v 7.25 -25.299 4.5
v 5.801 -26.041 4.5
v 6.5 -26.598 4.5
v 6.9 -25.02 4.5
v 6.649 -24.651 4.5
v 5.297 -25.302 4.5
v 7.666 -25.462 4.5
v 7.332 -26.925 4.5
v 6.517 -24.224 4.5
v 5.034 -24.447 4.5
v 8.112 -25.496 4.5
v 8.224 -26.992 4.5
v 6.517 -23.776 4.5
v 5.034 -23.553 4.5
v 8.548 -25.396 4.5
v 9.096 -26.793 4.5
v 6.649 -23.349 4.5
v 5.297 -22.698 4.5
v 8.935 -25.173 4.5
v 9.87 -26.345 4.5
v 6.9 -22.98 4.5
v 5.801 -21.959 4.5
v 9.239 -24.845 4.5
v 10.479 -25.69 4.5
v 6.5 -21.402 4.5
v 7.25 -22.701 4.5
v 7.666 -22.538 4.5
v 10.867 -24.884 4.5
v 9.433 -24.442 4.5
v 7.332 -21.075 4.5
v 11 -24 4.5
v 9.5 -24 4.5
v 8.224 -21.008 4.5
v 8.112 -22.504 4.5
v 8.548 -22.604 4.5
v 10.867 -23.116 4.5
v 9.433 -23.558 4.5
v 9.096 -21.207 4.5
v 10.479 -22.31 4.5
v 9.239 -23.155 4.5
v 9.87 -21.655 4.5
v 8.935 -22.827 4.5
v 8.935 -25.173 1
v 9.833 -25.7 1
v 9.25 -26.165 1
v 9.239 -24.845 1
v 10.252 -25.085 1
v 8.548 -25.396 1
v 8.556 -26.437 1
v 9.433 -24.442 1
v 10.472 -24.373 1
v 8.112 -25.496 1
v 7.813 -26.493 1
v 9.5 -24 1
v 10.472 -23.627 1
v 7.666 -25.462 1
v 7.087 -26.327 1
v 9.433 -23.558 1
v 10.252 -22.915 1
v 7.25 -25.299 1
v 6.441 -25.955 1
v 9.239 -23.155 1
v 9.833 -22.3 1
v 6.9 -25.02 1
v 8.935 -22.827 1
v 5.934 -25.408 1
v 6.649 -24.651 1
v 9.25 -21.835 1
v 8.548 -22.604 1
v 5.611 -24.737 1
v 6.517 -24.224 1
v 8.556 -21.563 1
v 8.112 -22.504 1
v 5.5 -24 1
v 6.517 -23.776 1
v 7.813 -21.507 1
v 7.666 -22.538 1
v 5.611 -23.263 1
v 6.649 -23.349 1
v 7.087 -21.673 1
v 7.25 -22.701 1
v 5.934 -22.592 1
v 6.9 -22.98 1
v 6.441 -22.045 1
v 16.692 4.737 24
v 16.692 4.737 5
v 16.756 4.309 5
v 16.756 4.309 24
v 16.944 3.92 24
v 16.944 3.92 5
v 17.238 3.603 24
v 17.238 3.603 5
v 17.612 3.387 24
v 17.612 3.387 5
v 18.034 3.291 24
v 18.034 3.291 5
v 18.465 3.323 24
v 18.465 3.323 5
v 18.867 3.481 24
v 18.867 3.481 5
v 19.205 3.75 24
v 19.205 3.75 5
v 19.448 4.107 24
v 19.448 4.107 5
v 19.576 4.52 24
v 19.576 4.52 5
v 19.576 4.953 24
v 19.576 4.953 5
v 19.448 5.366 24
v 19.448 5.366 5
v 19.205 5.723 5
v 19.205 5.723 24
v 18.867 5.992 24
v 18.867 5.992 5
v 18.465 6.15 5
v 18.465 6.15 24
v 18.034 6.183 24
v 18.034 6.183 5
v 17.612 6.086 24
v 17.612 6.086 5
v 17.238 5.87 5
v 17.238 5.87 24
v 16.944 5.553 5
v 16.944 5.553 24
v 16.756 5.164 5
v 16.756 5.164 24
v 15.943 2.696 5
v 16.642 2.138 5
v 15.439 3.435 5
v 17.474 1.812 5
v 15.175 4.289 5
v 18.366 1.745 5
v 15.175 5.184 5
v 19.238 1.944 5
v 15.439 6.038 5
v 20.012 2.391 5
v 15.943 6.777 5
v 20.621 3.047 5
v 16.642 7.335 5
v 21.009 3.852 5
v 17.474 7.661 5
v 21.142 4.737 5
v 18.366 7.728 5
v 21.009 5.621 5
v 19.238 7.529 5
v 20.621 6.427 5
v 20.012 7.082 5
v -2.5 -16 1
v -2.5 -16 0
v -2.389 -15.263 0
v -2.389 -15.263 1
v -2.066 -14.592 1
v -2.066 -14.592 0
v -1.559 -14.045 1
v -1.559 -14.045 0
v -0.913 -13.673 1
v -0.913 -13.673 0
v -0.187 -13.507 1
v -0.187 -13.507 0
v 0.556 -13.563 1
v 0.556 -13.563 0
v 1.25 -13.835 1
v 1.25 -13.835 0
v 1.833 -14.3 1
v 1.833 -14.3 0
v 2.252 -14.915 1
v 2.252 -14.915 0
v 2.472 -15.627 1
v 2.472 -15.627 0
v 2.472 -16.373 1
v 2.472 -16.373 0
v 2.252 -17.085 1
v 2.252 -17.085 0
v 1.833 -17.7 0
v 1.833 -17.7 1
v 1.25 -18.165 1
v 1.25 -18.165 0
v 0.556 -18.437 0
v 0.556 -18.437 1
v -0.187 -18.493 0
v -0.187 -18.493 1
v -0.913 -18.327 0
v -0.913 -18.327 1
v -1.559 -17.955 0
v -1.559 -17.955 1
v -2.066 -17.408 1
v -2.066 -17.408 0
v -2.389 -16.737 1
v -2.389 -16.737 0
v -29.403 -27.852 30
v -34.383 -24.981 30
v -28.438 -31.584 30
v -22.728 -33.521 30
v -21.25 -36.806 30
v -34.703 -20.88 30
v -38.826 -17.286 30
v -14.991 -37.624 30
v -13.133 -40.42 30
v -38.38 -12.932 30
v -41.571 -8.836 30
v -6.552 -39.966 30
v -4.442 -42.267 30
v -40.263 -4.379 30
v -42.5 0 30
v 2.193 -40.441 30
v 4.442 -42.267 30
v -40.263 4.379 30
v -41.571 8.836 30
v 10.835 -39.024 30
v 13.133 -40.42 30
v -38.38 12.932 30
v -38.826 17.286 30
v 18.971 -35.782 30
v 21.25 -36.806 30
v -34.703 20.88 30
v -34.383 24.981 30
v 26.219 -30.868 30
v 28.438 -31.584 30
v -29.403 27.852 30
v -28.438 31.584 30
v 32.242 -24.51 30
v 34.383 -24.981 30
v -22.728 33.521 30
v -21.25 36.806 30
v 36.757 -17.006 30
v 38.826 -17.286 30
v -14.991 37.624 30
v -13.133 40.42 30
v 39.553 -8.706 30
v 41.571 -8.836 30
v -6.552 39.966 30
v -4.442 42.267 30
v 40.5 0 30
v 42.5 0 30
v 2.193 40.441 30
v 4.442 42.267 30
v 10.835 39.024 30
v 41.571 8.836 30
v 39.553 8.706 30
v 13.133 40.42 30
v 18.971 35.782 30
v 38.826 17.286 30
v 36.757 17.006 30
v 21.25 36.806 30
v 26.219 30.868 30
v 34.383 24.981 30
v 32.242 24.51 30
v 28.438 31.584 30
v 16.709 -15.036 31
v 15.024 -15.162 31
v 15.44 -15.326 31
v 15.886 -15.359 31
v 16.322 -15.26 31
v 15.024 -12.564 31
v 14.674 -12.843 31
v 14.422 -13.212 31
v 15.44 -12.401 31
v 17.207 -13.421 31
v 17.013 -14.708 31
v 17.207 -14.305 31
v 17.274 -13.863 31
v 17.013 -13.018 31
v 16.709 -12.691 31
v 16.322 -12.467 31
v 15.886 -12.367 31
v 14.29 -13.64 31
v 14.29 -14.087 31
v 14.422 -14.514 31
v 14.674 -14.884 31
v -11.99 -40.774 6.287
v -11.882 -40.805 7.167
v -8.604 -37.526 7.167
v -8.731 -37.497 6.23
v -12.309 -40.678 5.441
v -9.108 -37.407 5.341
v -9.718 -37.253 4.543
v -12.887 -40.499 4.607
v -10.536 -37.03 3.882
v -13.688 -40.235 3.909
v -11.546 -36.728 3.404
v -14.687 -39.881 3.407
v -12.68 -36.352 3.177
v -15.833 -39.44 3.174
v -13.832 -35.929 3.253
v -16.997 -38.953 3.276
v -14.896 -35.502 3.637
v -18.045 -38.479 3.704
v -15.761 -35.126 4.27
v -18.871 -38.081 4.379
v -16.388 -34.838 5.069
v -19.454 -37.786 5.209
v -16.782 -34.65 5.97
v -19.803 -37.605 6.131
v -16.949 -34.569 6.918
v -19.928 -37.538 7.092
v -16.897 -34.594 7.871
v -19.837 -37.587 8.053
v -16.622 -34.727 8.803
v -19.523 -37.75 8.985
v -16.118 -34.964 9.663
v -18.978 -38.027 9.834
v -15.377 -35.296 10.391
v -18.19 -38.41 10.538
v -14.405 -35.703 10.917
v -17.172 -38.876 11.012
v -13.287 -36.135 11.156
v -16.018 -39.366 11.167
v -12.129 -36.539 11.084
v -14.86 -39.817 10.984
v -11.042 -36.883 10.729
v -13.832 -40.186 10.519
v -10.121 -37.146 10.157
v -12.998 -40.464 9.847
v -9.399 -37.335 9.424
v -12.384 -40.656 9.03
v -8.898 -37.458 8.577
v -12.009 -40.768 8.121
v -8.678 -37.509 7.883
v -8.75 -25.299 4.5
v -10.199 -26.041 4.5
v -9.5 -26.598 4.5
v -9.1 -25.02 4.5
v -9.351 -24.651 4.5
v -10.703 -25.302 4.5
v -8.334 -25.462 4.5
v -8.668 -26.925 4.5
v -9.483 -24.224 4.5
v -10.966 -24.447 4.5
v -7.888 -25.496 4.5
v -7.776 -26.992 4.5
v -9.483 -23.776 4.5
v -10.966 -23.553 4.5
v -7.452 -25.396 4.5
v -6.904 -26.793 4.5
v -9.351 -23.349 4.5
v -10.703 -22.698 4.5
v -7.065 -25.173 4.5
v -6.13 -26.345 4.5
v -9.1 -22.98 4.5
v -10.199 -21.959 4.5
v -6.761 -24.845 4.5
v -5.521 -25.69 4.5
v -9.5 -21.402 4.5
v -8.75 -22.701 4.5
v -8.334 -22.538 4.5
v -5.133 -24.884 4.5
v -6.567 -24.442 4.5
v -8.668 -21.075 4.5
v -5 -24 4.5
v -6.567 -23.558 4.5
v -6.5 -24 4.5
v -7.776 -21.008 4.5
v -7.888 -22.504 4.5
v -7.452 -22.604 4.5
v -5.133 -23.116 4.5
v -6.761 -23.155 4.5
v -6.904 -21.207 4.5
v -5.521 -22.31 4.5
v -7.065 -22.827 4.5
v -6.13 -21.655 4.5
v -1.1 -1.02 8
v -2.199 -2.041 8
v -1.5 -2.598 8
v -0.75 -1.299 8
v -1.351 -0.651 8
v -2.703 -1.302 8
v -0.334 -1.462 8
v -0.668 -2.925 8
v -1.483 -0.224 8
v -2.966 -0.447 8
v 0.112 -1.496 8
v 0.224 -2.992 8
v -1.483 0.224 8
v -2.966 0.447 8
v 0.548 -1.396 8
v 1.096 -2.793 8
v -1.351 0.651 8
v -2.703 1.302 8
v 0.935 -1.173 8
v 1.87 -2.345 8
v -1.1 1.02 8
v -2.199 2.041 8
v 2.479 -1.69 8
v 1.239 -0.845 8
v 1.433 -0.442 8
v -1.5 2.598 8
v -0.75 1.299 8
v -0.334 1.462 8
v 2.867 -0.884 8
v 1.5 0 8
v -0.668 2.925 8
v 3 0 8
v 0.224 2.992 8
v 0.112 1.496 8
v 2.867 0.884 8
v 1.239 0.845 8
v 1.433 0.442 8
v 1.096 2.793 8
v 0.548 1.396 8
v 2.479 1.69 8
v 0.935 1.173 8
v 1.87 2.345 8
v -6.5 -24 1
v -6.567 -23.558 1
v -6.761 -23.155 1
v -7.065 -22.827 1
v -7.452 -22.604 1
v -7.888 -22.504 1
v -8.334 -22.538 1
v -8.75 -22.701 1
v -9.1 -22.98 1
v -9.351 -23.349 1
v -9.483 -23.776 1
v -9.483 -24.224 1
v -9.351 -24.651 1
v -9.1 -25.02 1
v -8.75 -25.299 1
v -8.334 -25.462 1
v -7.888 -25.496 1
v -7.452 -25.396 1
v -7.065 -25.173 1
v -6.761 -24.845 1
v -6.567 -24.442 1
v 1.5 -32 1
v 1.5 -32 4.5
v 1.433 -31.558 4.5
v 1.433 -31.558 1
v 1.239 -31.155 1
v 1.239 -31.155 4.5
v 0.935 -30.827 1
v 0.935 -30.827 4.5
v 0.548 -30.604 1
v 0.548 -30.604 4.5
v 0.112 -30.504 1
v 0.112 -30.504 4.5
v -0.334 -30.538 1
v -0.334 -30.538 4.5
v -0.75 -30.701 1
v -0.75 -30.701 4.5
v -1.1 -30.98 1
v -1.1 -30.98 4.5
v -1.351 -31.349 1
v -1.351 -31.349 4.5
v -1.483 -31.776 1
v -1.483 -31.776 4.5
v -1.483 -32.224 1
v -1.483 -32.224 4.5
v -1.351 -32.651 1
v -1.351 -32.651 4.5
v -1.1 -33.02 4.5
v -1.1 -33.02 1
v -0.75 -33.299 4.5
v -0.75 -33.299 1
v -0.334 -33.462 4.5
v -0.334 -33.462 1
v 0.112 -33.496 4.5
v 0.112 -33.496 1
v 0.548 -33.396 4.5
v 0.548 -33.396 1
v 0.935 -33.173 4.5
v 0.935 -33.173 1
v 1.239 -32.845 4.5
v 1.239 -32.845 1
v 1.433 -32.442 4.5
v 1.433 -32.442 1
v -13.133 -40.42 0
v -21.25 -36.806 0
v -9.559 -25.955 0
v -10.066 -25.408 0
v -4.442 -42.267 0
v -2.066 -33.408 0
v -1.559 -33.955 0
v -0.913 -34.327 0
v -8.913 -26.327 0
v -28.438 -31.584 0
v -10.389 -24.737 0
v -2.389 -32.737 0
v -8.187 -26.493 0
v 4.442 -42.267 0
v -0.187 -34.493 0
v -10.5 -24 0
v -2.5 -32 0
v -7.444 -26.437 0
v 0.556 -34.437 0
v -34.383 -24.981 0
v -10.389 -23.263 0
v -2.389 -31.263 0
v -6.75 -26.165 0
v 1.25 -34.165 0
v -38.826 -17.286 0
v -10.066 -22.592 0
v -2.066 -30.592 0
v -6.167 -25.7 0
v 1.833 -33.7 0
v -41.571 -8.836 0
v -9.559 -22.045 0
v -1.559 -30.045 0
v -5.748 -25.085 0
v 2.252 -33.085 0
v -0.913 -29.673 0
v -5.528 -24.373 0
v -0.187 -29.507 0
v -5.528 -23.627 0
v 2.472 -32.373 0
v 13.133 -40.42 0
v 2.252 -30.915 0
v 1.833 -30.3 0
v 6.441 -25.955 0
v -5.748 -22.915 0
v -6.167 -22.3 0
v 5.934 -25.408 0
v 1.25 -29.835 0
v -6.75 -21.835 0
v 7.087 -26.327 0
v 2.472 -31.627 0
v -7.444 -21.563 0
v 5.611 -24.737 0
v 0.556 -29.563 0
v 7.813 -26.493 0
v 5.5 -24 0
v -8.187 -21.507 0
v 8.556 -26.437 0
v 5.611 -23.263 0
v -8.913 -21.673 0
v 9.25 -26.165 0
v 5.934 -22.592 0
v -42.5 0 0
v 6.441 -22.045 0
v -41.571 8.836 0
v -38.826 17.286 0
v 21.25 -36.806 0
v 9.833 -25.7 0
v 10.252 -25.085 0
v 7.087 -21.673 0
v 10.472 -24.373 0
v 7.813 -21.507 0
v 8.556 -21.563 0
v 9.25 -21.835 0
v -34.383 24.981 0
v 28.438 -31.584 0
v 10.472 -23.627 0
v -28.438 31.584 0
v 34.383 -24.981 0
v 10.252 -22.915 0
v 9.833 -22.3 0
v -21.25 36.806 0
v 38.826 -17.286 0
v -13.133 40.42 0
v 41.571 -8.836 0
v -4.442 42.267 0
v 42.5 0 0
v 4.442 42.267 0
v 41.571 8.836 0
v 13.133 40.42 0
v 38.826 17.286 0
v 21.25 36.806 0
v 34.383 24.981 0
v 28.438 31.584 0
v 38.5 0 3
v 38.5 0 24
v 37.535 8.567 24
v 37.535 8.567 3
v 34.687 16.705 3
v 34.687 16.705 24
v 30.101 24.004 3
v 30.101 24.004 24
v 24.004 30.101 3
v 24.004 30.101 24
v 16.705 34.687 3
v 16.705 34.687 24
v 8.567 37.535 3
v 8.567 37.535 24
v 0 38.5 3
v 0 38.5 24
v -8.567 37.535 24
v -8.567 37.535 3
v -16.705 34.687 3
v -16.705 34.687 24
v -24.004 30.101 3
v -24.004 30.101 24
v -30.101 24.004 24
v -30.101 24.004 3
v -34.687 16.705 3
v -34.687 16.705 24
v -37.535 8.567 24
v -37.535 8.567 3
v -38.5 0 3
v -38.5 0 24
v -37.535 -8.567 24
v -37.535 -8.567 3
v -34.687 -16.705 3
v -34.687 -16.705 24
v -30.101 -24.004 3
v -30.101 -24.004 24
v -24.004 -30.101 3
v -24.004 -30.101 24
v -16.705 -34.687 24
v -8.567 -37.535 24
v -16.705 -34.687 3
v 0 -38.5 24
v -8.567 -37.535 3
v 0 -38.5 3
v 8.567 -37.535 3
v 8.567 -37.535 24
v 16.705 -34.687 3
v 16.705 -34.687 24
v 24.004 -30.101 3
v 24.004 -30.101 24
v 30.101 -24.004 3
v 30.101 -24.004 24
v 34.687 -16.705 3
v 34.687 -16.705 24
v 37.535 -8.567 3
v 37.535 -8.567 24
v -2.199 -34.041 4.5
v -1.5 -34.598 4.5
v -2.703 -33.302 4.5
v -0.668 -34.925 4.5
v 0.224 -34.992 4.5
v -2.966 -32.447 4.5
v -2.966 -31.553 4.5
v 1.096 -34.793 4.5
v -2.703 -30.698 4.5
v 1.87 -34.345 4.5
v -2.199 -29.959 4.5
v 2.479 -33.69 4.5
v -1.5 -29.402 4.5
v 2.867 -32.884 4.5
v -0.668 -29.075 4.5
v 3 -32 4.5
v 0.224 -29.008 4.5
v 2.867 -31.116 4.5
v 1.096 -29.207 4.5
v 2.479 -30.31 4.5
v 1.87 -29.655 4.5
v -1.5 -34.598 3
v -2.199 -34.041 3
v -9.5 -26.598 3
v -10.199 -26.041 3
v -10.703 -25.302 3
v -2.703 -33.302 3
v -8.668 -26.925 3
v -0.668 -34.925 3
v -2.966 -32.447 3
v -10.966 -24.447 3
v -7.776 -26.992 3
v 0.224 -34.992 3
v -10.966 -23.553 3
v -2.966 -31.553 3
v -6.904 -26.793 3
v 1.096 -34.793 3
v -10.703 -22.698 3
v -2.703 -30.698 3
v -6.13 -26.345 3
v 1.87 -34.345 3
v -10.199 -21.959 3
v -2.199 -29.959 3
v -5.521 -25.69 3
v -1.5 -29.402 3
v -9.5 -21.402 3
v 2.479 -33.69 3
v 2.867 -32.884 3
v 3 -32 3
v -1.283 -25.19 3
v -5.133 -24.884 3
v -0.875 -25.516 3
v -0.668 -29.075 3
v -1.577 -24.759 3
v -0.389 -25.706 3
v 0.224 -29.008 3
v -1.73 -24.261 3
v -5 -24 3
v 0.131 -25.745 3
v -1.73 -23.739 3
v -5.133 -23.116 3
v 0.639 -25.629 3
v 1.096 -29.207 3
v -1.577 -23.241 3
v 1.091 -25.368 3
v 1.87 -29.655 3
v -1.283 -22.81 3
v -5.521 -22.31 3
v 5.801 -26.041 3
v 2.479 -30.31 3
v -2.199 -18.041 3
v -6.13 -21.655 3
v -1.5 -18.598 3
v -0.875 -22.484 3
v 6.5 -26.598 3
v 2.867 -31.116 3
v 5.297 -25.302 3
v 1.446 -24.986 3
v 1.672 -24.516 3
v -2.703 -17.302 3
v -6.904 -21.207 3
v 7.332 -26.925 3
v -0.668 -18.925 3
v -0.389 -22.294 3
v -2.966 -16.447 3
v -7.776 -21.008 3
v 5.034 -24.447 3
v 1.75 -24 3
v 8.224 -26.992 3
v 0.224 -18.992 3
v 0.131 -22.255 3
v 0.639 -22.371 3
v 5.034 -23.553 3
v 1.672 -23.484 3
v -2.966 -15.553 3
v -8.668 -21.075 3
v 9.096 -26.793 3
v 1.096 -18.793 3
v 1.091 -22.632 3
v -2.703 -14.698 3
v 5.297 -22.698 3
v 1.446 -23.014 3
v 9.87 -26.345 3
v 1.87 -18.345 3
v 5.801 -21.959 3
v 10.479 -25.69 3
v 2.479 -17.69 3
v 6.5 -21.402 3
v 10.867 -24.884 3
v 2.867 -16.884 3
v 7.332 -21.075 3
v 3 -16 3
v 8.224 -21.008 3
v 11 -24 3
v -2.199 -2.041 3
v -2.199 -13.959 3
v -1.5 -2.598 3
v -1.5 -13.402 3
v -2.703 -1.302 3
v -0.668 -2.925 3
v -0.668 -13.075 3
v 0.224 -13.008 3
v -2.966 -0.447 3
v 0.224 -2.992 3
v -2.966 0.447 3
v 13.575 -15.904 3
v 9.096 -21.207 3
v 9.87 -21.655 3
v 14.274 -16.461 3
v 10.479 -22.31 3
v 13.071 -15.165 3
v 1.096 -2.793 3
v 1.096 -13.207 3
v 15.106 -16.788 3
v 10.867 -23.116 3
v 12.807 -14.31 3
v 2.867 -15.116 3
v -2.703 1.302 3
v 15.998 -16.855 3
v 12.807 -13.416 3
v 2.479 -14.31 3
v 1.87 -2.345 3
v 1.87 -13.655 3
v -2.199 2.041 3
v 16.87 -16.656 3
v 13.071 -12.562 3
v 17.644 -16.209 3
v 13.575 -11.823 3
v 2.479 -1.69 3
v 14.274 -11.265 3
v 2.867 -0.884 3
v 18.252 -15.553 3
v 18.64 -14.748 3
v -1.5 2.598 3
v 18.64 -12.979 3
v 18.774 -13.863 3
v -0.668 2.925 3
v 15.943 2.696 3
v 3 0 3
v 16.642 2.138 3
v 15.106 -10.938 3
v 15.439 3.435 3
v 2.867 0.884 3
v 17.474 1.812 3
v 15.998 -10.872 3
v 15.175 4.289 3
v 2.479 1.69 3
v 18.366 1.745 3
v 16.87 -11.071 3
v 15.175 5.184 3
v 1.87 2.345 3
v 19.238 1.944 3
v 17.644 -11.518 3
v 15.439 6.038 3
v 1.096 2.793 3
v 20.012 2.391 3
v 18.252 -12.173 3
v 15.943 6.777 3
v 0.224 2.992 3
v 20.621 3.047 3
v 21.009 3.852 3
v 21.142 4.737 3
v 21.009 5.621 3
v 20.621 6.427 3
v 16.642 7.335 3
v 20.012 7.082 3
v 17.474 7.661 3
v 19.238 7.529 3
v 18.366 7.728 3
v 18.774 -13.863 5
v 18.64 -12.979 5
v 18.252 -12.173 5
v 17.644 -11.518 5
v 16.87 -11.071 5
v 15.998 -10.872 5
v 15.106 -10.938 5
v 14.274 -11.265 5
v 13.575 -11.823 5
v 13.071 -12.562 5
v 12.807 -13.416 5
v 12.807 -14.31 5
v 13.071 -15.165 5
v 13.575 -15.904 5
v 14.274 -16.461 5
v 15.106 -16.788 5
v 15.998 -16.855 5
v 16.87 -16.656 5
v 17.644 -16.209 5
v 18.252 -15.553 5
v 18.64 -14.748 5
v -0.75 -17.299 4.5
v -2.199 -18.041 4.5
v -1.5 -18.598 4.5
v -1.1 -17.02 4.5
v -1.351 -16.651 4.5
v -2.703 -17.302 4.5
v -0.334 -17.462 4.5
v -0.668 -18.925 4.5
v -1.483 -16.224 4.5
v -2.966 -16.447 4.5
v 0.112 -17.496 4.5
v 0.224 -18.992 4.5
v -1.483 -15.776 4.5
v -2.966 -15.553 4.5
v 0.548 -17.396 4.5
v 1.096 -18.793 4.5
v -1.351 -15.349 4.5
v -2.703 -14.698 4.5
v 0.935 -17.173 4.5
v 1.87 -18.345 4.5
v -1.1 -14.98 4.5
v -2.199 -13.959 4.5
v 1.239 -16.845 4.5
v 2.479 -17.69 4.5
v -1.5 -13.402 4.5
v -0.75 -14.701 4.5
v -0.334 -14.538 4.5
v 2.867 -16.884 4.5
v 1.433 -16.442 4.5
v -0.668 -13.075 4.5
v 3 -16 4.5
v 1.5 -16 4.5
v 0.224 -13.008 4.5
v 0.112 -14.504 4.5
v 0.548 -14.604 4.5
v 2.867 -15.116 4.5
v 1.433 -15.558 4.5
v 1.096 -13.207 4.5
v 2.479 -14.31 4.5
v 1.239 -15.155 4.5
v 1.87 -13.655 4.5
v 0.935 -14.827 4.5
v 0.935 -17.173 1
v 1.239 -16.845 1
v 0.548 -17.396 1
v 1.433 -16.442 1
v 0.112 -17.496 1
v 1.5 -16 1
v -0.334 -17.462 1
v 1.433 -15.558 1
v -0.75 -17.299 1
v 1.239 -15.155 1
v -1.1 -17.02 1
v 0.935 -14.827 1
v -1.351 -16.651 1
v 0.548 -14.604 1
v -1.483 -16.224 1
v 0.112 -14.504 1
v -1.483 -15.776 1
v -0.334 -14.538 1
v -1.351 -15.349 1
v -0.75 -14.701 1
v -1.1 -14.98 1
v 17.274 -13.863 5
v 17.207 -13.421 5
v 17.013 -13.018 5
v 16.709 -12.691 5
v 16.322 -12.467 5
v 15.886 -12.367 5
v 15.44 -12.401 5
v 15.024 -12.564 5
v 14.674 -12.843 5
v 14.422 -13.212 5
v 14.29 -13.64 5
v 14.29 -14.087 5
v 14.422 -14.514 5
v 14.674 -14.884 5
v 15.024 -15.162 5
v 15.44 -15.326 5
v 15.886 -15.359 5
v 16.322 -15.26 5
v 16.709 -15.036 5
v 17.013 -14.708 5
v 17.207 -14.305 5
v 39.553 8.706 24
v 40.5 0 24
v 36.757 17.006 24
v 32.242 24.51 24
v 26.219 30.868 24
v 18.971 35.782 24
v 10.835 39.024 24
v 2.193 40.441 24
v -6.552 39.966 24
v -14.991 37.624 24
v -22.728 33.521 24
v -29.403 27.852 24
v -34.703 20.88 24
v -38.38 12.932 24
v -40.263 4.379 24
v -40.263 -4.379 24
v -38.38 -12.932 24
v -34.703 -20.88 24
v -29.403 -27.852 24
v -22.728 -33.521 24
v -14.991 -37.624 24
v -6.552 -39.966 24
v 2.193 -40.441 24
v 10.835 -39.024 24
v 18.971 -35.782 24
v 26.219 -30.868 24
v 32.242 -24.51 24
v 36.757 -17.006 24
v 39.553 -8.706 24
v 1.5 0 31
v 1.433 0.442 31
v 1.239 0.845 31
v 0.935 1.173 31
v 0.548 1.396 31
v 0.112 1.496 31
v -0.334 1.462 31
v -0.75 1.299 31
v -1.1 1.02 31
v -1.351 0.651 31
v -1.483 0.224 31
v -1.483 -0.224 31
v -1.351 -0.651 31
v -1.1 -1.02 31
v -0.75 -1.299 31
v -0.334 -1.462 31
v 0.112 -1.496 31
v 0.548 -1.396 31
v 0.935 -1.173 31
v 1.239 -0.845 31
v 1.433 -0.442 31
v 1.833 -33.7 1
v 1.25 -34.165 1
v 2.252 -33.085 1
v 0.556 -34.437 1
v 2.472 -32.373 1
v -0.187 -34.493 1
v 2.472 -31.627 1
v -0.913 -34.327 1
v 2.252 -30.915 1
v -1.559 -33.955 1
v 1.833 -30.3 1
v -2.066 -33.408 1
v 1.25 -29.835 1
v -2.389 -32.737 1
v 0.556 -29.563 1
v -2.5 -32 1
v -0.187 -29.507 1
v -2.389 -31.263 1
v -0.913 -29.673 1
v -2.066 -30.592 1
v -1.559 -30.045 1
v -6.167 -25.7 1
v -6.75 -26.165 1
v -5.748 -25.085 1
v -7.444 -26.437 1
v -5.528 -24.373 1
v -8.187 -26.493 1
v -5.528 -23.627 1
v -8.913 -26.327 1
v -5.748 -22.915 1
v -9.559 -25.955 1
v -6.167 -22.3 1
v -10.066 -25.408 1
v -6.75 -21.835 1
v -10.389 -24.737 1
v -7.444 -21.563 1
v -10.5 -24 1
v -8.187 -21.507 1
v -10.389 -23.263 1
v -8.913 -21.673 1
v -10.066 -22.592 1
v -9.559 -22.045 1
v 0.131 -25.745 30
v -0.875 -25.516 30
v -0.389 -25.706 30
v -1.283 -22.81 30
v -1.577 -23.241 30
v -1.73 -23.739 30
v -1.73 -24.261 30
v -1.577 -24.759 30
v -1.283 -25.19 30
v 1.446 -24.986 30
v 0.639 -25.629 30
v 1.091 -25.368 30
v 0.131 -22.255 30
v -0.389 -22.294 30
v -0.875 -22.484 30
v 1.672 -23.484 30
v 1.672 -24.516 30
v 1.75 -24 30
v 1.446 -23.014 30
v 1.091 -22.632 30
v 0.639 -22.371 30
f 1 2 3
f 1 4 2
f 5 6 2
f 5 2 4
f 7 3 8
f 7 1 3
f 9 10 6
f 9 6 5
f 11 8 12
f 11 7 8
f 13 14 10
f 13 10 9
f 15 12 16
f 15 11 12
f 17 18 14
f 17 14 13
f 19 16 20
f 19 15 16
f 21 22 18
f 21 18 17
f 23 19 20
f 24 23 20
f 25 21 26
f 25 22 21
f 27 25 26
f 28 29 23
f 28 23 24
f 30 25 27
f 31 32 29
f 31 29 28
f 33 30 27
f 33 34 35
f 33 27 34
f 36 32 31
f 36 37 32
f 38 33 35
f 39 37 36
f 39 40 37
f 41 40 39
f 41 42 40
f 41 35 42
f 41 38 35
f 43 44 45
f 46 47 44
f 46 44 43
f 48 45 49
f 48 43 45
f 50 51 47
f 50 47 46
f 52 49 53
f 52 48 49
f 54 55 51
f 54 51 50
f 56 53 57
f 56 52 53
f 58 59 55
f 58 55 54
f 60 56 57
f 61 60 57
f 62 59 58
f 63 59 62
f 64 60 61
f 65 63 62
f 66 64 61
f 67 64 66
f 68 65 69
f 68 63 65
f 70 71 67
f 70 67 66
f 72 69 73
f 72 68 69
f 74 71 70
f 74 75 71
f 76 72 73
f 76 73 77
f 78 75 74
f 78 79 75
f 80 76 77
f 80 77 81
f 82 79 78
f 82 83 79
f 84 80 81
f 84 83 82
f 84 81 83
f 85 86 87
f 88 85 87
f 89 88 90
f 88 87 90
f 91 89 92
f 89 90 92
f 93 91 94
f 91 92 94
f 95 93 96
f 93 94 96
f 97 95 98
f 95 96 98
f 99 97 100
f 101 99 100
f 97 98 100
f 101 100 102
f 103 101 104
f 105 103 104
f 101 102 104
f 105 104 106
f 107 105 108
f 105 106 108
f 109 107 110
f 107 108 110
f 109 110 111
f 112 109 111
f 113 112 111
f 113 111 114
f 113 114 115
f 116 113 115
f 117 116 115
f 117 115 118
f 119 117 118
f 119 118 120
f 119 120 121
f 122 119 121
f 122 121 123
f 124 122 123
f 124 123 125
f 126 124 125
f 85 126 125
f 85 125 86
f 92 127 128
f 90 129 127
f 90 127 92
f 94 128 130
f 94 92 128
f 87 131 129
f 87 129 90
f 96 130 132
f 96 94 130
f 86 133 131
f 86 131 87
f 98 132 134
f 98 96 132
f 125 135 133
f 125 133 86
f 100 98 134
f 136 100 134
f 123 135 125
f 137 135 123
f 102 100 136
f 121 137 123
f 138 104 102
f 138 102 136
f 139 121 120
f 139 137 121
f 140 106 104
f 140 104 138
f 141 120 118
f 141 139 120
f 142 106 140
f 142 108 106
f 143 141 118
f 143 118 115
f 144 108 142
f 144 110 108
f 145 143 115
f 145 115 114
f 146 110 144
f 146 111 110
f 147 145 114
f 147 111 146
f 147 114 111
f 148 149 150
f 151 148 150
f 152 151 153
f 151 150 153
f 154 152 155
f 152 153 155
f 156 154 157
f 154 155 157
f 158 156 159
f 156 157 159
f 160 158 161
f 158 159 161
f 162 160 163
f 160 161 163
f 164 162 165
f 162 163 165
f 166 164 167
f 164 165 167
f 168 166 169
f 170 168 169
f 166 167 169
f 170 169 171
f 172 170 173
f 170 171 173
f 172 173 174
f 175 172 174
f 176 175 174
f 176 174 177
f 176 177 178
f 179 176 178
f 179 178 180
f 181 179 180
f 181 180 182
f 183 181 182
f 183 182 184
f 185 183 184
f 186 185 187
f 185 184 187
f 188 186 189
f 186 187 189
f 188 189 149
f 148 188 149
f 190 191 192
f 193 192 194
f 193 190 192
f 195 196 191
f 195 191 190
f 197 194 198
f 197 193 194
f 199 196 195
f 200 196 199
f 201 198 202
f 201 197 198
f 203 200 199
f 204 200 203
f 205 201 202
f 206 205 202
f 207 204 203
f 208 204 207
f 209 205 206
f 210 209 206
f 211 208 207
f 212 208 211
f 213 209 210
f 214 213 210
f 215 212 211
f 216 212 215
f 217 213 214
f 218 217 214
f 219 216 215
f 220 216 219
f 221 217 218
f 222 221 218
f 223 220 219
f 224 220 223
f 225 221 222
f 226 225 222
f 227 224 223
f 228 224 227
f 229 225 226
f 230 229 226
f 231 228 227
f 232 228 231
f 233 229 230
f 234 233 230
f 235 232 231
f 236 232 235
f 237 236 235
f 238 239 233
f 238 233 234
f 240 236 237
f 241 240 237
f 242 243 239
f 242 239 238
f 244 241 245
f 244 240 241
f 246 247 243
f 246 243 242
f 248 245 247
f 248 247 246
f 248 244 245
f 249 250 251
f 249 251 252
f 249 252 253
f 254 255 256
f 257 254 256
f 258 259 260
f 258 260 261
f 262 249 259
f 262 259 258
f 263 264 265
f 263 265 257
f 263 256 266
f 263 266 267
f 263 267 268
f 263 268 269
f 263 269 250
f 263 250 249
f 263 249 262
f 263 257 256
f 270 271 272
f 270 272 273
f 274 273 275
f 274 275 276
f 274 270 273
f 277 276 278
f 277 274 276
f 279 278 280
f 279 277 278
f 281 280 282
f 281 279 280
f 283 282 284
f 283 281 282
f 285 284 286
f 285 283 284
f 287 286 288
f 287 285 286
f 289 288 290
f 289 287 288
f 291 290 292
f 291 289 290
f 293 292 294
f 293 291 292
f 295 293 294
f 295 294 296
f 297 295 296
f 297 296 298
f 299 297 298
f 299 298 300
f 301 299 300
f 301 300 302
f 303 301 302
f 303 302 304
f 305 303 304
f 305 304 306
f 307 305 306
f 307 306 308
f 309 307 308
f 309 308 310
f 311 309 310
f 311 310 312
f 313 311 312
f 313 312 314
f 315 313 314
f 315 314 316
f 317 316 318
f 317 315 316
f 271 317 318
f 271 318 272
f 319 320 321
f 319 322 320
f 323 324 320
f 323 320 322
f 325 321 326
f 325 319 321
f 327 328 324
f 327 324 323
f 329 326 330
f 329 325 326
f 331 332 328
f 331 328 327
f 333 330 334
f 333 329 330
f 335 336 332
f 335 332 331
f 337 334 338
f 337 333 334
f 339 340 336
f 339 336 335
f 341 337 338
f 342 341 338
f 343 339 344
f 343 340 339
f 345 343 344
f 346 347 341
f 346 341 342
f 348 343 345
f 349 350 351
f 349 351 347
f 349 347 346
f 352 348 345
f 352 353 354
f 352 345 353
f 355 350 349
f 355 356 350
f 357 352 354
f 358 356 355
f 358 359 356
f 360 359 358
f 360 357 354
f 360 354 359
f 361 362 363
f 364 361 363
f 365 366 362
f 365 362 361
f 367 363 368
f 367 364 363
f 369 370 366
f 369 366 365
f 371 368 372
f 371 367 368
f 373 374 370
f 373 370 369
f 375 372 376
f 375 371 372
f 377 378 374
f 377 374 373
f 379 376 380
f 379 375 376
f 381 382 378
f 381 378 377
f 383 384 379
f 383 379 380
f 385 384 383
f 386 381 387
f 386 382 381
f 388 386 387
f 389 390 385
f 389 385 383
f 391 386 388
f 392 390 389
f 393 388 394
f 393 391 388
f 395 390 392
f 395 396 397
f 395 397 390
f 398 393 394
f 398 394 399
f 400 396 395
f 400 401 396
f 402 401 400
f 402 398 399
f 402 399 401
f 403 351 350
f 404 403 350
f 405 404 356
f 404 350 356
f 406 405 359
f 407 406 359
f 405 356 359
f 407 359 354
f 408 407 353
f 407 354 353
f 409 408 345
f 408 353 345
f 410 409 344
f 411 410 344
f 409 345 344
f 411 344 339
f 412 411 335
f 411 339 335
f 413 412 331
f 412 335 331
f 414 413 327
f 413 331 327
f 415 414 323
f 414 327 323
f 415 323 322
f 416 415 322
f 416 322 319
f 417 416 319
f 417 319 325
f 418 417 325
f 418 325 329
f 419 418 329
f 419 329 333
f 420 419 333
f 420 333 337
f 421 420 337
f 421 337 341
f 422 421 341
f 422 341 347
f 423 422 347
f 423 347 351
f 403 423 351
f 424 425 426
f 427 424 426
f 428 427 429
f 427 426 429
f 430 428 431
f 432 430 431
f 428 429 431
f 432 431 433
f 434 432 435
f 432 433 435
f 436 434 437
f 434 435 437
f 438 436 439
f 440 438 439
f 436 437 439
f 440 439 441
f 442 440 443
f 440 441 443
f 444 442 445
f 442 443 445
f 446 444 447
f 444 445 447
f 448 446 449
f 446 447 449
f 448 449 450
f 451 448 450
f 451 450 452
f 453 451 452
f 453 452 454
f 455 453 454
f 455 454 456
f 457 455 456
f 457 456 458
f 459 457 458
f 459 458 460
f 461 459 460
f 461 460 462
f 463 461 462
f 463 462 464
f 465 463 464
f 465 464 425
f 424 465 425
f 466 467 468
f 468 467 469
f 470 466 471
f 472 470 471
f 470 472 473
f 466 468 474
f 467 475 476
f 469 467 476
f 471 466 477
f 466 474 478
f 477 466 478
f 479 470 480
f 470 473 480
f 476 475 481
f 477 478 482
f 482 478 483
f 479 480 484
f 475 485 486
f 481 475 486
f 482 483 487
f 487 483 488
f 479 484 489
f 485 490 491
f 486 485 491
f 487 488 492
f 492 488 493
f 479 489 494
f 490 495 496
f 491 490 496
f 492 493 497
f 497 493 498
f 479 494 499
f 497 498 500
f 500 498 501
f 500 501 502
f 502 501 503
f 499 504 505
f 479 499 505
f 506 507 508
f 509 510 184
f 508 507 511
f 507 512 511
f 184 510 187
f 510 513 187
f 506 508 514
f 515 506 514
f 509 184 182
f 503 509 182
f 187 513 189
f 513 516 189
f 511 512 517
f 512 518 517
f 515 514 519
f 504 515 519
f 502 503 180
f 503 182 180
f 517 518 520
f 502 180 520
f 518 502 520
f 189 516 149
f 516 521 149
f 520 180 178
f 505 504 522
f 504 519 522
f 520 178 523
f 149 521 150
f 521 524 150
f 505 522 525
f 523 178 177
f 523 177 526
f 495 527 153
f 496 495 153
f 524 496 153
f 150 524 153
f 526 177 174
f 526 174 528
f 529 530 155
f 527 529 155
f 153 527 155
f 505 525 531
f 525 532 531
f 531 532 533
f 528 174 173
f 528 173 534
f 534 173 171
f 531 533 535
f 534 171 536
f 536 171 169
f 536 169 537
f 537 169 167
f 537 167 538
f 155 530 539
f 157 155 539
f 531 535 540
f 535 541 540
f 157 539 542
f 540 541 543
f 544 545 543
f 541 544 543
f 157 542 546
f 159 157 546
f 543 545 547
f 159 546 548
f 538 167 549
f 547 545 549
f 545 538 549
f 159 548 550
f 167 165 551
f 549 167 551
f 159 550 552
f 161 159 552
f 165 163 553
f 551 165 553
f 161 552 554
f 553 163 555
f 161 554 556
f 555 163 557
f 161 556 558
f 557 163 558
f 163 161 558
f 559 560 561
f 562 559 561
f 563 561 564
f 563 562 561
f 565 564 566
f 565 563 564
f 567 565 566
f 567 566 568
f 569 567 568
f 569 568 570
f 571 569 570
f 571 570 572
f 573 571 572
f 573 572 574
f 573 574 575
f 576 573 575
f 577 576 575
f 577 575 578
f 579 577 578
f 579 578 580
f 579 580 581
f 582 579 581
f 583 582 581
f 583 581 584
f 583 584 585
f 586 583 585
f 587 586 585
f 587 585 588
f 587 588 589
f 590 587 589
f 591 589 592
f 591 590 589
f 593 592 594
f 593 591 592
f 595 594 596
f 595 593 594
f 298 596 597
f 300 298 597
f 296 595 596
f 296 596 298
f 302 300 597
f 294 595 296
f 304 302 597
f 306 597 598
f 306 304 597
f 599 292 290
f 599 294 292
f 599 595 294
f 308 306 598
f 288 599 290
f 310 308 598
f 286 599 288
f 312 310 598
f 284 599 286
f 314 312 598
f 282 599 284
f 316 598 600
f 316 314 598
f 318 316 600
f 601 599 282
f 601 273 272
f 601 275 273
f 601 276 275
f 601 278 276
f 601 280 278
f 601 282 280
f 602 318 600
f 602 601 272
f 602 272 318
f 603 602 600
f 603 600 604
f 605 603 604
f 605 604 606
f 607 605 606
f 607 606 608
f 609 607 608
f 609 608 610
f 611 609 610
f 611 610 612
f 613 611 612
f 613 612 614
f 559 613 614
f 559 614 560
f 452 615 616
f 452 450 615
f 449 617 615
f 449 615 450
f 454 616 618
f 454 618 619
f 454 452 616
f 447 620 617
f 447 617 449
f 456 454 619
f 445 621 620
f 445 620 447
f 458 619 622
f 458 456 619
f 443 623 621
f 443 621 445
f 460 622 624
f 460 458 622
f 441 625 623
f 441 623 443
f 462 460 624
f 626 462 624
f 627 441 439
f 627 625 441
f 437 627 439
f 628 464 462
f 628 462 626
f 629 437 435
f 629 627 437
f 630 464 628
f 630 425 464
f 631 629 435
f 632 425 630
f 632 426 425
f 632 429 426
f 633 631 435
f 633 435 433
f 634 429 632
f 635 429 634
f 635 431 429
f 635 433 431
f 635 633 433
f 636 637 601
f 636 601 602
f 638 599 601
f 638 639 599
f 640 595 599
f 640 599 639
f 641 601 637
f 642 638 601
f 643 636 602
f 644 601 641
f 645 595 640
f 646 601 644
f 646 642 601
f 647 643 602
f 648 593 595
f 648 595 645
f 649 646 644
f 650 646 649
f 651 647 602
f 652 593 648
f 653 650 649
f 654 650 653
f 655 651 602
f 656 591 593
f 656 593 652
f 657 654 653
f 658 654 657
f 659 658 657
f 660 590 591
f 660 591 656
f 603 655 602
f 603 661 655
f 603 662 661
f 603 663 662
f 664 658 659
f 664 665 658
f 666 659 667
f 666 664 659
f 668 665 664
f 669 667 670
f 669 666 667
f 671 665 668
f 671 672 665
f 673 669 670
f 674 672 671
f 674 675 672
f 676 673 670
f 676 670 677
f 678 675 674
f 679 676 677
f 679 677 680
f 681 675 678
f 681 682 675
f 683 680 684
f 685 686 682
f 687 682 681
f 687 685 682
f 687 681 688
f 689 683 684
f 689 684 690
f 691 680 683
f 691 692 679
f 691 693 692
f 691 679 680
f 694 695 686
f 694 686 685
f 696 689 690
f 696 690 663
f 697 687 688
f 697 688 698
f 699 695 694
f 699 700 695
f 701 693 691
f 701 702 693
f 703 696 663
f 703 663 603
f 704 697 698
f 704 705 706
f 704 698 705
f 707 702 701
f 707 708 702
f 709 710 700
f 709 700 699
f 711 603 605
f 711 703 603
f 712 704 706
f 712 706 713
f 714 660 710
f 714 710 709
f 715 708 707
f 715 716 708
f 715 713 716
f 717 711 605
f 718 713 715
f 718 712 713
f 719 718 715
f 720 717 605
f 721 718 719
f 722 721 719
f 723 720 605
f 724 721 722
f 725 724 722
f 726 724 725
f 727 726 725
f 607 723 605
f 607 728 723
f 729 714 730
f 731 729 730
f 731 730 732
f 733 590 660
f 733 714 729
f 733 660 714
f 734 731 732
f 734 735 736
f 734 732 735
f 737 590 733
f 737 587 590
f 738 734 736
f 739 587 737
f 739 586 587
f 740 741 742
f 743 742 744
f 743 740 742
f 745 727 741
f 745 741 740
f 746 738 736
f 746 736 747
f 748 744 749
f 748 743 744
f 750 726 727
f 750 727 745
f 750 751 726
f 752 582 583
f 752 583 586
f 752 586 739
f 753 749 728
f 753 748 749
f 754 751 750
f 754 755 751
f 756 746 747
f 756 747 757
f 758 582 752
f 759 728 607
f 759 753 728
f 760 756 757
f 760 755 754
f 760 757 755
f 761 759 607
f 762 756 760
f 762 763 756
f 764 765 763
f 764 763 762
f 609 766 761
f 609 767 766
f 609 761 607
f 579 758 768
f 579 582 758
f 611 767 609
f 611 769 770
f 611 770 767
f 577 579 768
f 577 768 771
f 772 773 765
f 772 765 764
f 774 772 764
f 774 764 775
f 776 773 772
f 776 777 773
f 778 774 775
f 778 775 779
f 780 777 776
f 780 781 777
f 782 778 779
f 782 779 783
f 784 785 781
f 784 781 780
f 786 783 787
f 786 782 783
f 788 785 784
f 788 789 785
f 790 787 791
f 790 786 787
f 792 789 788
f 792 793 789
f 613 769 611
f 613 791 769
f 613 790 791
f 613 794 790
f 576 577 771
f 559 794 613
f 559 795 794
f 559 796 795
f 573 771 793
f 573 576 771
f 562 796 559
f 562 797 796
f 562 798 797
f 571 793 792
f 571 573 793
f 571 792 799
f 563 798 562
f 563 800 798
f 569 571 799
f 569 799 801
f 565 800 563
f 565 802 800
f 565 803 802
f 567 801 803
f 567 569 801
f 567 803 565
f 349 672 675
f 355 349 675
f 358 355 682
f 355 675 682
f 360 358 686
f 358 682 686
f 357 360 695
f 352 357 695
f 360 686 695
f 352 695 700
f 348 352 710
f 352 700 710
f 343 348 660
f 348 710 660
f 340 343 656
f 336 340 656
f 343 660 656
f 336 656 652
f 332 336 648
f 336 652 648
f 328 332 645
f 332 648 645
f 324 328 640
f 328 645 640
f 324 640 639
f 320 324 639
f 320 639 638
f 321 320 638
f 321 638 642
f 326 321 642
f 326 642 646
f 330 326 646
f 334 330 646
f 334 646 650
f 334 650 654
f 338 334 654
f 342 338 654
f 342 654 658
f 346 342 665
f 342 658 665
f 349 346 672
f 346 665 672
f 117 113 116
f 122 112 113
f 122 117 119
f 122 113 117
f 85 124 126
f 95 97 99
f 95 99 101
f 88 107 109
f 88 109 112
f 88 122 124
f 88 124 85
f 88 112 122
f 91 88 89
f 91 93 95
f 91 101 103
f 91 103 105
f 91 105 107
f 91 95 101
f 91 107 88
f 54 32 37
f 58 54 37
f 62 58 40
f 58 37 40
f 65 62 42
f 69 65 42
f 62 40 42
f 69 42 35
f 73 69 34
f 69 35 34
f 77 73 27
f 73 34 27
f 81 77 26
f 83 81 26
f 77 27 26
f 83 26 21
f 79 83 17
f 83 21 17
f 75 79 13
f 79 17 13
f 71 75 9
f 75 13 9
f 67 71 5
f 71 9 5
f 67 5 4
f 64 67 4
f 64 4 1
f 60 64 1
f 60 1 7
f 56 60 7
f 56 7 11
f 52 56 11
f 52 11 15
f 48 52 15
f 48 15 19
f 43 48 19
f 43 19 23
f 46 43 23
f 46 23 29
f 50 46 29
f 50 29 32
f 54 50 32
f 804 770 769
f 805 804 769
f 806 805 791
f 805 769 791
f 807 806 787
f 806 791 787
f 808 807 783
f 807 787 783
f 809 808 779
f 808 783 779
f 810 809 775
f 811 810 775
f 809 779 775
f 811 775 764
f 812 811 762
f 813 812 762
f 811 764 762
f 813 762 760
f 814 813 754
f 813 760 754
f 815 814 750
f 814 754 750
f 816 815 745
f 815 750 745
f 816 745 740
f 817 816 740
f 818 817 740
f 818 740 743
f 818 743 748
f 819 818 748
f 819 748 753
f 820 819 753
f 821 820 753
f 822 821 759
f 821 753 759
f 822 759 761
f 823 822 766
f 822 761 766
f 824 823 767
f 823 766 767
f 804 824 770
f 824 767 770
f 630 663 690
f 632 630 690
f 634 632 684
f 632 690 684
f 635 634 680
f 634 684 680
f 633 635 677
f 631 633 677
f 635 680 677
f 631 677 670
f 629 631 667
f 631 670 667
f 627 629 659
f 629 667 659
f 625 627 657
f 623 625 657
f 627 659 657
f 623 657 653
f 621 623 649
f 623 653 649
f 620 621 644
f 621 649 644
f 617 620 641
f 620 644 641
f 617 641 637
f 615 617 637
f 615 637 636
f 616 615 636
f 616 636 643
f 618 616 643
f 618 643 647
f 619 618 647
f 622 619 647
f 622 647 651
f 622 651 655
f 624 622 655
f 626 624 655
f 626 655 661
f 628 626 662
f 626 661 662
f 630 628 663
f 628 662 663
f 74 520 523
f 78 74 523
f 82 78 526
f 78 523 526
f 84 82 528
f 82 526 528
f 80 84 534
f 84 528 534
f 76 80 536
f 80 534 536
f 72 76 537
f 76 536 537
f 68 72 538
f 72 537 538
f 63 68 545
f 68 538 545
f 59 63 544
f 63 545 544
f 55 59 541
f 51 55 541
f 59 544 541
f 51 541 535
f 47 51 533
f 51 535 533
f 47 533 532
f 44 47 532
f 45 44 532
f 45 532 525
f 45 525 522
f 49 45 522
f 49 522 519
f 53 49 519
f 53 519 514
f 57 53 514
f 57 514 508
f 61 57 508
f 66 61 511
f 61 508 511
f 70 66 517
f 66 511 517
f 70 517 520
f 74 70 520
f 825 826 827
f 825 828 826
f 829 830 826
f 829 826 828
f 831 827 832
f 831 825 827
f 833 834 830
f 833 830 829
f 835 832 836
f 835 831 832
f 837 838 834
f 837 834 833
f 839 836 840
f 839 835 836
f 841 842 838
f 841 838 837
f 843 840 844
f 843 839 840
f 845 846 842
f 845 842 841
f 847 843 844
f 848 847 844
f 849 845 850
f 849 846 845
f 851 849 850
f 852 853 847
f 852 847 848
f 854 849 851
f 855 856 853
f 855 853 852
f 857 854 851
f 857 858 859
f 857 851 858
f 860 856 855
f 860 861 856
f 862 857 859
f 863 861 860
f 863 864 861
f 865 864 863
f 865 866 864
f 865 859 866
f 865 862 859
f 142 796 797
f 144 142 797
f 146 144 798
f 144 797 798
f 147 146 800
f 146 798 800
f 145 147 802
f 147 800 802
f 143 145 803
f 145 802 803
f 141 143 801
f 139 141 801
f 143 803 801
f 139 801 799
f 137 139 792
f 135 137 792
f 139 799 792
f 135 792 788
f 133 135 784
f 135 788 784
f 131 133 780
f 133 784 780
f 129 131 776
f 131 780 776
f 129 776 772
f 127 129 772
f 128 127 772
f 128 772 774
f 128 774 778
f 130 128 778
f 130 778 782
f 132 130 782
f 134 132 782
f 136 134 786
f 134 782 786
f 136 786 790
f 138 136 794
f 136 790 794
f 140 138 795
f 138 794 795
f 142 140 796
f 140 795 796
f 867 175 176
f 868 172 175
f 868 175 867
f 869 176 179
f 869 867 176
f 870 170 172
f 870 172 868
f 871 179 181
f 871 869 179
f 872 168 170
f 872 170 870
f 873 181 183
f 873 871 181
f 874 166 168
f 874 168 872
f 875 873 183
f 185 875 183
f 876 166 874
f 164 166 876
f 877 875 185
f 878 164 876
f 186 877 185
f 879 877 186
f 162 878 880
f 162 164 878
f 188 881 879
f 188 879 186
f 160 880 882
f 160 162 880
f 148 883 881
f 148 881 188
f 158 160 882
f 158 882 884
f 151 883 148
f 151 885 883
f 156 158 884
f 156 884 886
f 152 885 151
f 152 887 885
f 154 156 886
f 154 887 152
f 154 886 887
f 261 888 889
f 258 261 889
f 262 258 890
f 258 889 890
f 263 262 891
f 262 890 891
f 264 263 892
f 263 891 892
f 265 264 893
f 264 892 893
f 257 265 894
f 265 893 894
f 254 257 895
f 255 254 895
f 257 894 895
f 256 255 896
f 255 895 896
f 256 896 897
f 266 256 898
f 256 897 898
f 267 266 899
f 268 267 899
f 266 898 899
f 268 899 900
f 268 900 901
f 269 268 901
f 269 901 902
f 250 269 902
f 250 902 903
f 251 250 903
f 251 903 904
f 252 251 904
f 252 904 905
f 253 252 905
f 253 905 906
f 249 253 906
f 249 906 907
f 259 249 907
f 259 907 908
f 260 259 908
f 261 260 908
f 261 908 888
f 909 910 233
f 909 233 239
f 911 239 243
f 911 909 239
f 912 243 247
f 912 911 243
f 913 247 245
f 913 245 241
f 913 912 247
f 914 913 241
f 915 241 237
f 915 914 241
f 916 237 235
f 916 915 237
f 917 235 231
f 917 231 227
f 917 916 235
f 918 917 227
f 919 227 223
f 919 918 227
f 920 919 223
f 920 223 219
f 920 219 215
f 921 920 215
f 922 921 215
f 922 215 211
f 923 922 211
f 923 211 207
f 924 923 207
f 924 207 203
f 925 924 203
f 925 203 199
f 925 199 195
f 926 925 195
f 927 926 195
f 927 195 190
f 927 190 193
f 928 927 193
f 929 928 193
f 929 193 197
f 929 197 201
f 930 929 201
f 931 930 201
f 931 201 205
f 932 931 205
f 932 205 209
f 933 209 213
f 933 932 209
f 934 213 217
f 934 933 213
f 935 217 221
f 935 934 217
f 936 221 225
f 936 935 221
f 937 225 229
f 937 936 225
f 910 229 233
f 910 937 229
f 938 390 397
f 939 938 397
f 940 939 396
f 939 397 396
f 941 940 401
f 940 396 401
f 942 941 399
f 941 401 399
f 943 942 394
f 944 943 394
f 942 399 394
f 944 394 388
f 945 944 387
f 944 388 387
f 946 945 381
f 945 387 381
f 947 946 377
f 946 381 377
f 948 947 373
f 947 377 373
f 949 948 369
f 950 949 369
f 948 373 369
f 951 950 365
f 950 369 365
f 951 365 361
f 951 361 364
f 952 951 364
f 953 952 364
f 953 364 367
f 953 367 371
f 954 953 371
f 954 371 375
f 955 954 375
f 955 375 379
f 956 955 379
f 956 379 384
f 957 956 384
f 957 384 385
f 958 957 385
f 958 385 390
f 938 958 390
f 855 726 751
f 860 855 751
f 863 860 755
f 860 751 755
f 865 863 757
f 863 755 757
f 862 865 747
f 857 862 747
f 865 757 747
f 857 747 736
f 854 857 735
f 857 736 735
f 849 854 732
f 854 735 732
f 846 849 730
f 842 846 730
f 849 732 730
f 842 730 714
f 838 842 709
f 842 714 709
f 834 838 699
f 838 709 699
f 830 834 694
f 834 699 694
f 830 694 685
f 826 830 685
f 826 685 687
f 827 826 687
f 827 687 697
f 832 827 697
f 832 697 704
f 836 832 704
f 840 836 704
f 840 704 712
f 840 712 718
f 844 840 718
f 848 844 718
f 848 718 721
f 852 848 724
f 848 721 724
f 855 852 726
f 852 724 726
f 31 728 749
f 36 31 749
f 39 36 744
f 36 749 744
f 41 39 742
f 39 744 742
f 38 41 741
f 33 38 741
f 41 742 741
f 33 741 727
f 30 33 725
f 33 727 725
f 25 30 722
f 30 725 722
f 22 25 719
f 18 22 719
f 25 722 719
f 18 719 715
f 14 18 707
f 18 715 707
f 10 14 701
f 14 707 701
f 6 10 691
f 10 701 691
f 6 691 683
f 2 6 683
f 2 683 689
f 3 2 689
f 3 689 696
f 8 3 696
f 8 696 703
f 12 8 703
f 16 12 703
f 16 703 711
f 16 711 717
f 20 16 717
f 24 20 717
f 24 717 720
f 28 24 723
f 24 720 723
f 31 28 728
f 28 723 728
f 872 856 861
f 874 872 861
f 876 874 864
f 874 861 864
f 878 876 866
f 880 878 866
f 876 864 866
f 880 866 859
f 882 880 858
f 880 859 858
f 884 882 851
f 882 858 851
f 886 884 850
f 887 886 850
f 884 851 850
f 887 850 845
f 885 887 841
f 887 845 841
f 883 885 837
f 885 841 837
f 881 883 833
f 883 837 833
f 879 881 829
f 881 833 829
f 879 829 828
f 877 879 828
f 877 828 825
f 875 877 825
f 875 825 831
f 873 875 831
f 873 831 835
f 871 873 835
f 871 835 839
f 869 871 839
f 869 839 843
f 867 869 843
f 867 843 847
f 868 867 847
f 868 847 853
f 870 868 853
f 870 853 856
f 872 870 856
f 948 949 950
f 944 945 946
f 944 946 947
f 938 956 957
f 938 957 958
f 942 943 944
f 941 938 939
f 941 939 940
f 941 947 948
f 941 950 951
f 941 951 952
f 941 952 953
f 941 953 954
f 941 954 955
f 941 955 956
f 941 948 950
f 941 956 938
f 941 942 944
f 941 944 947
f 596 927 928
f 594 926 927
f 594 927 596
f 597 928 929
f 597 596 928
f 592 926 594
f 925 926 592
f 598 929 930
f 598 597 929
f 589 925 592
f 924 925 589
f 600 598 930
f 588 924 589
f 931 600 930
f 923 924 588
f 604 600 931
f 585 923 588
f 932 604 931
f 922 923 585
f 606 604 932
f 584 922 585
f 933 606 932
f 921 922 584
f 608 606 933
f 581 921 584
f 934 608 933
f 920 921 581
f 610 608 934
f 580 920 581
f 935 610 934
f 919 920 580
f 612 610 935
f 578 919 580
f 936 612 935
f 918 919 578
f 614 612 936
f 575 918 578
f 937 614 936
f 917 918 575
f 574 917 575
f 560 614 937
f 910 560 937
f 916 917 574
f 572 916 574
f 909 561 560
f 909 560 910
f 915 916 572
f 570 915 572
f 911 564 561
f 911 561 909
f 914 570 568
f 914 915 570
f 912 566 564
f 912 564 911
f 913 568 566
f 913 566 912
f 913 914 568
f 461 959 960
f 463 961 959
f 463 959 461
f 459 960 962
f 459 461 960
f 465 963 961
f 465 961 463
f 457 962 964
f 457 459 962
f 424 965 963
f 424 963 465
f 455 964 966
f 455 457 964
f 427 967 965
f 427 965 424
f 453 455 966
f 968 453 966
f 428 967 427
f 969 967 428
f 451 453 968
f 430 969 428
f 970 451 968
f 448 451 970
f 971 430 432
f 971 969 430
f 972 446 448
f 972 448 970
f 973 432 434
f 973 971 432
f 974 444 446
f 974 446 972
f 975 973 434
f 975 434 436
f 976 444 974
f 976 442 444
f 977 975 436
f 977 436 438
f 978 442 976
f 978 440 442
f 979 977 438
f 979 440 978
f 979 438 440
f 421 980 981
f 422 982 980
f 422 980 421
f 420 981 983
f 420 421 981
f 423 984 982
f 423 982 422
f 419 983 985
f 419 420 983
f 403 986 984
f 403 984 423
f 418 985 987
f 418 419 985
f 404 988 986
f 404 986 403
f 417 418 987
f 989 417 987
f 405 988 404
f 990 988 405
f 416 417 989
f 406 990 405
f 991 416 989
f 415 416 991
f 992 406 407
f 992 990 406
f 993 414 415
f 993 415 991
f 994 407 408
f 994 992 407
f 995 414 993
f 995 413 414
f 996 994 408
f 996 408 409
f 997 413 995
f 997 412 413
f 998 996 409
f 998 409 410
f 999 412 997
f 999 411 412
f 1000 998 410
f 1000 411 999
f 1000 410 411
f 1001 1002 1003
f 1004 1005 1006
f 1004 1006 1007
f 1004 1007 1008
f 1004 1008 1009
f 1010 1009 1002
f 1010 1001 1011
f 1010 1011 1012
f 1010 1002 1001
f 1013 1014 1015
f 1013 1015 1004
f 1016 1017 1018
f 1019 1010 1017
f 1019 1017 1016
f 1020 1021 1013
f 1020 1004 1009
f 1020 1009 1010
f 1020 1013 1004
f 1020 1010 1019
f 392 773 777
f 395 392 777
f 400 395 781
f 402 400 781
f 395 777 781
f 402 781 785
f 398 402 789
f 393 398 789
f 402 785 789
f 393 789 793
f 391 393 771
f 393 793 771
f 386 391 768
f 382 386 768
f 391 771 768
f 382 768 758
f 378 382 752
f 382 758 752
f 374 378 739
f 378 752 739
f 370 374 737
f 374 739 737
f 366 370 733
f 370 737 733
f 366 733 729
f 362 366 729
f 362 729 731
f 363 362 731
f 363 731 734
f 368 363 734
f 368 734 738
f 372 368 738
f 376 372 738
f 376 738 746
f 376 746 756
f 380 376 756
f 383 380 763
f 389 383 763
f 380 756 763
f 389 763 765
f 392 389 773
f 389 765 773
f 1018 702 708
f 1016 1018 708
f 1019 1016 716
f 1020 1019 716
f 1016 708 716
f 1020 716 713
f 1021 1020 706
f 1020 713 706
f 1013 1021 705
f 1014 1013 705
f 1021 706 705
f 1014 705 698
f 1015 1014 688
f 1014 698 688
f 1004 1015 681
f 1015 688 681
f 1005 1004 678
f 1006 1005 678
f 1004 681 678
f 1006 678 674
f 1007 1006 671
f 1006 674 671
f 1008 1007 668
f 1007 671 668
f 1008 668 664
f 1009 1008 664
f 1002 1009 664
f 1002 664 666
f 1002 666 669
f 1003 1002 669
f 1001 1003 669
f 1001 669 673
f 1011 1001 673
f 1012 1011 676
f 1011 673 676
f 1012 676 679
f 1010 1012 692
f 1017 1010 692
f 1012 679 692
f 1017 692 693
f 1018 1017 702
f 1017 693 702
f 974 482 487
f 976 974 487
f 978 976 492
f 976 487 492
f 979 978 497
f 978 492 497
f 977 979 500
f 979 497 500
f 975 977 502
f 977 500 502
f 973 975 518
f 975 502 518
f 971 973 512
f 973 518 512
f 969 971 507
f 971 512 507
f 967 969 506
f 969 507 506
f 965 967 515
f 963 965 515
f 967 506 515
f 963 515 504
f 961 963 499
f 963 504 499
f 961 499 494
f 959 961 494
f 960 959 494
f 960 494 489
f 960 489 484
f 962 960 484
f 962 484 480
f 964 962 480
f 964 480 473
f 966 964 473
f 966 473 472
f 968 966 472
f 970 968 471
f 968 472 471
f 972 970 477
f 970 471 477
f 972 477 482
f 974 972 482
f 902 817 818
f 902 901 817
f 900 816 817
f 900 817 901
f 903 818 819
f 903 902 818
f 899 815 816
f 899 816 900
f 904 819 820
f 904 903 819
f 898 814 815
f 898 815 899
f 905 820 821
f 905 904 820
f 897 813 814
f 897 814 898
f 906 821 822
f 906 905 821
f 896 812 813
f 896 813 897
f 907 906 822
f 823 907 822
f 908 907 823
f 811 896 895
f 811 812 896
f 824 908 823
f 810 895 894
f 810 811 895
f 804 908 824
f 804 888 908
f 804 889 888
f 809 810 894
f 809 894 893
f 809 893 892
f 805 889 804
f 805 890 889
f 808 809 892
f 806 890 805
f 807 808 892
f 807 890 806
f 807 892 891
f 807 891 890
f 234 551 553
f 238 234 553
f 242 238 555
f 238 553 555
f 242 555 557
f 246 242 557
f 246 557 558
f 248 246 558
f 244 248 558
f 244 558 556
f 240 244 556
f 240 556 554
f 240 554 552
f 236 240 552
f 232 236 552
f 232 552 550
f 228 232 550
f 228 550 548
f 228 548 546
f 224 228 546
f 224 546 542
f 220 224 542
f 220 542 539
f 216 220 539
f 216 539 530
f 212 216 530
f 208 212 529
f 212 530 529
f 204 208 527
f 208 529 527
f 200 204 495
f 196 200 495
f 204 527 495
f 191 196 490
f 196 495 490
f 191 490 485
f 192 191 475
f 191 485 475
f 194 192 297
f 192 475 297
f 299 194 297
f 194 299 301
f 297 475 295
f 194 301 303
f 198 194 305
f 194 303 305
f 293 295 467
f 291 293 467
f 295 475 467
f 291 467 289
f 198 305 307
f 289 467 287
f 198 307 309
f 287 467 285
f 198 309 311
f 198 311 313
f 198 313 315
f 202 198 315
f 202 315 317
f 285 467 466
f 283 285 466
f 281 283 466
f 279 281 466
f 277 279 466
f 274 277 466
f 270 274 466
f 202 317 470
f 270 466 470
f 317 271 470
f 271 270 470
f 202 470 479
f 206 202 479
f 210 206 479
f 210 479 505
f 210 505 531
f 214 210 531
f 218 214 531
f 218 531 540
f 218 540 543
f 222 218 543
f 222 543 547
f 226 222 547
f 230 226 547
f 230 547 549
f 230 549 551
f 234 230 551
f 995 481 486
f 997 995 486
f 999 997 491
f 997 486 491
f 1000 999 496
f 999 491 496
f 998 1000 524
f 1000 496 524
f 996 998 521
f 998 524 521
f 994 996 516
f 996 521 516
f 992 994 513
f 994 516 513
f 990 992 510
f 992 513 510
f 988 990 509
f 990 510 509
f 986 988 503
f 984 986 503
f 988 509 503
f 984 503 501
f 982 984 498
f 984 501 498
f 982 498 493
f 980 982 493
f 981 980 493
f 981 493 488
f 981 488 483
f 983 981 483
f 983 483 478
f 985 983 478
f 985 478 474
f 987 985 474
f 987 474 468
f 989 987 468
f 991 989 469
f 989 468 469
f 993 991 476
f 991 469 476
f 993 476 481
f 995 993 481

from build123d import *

# Parameters (mm, degrees)
SKETCH_1_R              = 42.5
SKETCH_1_R_2            = 40.5
EXTRUDE_1_DEPTH         = 30
SKETCH_2_R              = 40.5
SKETCH_2_R_2            = 38.5
EXTRUDE_2_DEPTH         = 24
EXTRUDE_3_OUTLINE_R     = 38.5
EXTRUDE_3_DEPTH         = 3
SKETCH_5_R              = 1.75
EXTRUDE_4_DEPTH         = 27
SKETCH_10_R             = 3
EXTRUDE_10_DEPTH        = 1.5
SKETCH_21_R             = 1.5
CUT_EXTRUDE_1_DEPTH     = 66.289738857
SKETCH_6_R              = 1.5
EXTRUDE_5_DEPTH         = 28
SKETCH_7_R              = 3
EXTRUDE_6_DEPTH         = 2
SKETCH_8_R              = 1.45
EXTRUDE_7_DEPTH         = 21
SKETCH_9_R              = 3
EXTRUDE_8_DEPTH         = 2
SKETCH_22_R             = 2.5
CUT_EXTRUDE_2_DEPTH     = 1
SKETCH_23_R             = 1.5
EXTRUDE_11_DEPTH        = 28
SKETCH_25_R             = 3
EXTRUDE_12_DEPTH        = 5
CUT_EXTRUDE_START       = -40.635067554
CUT_EXTRUDE_3_OUTLINE_R = 4
CUT_EXTRUDE_3_DEPTH     = 8.016303225


# Read off the part's stored shape, not the designer's step: 凸台-拉伸3, 切除-拉伸3
with BuildPart() as part:
    # 草图1 → 凸台-拉伸1 (new body)
    with BuildSketch(Plane.XY):
        Circle(SKETCH_1_R)
        Circle(SKETCH_1_R_2, mode=Mode.SUBTRACT)
    extrude(amount=EXTRUDE_1_DEPTH)

    # 草图2 → 凸台-拉伸2 (add)
    with BuildSketch(Plane.XY):
        Circle(SKETCH_2_R)
        Circle(SKETCH_2_R_2, mode=Mode.SUBTRACT)
    extrude(amount=EXTRUDE_2_DEPTH)

    # 凸台-拉伸3 outline → 凸台-拉伸3 (add)
    with BuildSketch(Plane.XY):
        Circle(EXTRUDE_3_OUTLINE_R)
    extrude(amount=EXTRUDE_3_DEPTH)

    # 草图5 → 凸台-拉伸4 (add)
    with BuildSketch(Plane.XY.offset(3)):
        with Locations((0, -24)):
            Circle(SKETCH_5_R)
    extrude(amount=EXTRUDE_4_DEPTH)

    # 草图10 → 凸台-拉伸10 (add)
    with BuildSketch(Plane.XY.offset(3)):
        with Locations((8, -24)):
            Circle(SKETCH_10_R)
        with Locations((0, -16)):
            Circle(SKETCH_10_R)
        with Locations((-8, -24)):
            Circle(SKETCH_10_R)
        with Locations((0, -32)):
            Circle(SKETCH_10_R)
    extrude(amount=EXTRUDE_10_DEPTH)

    # 草图21 → 切除-拉伸1 (cut, through all)
    with BuildSketch(Plane.XY.offset(4.5)):
        with Locations((-8, -24)):
            Circle(SKETCH_21_R)
        with Locations((0, -16)):
            Circle(SKETCH_21_R)
        with Locations((8, -24)):
            Circle(SKETCH_21_R)
        with Locations((0, -32)):
            Circle(SKETCH_21_R)
    extrude(amount=-CUT_EXTRUDE_1_DEPTH, mode=Mode.SUBTRACT)

    # 草图6 → 凸台-拉伸5 (add)
    with BuildSketch(Plane.XY.offset(3)):
        with Locations((15.773694335, -13.86328125)):
            Circle(SKETCH_6_R)
    extrude(amount=EXTRUDE_5_DEPTH)

    # 草图7 → 凸台-拉伸6 (add)
    with BuildSketch(Plane.XY.offset(3)):
        with Locations((15.773694335, -13.86328125)):
            Circle(SKETCH_7_R)
    extrude(amount=EXTRUDE_6_DEPTH)

    # 草图8 → 凸台-拉伸7 (add)
    with BuildSketch(Plane.XY.offset(3)):
        with Locations(Location((18.141870405, 4.736563967, 0), (0, 0, 180))):
            Circle(SKETCH_8_R)
    extrude(amount=EXTRUDE_7_DEPTH)

    # 草图9 → 凸台-拉伸8 (add)
    with BuildSketch(Plane.XY.offset(3)):
        with Locations((18.141870405, 4.736563967)):
            Circle(SKETCH_9_R)
    extrude(amount=EXTRUDE_8_DEPTH)

    # 草图22 → 切除-拉伸2 (cut)
    with BuildSketch(Plane(origin=(0, 0, 0), x_dir=(-1, 0, 0), z_dir=(0, 0, -1))):
        with Locations((-8, -24)):
            Circle(SKETCH_22_R)
        with Locations((0, -16)):
            Circle(SKETCH_22_R)
        with Locations((8, -24)):
            Circle(SKETCH_22_R)
        with Locations((0, -32)):
            Circle(SKETCH_22_R)
    extrude(amount=-CUT_EXTRUDE_2_DEPTH, mode=Mode.SUBTRACT)

    # 草图23 → 凸台-拉伸11 (add)
    with BuildSketch(Plane.XY.offset(3)):
        Circle(SKETCH_23_R)
    extrude(amount=EXTRUDE_11_DEPTH)

    # 草图25 → 凸台-拉伸12 (add)
    with BuildSketch(Plane.XY.offset(3)):
        Circle(SKETCH_25_R)
    extrude(amount=EXTRUDE_12_DEPTH)

    # 切除-拉伸3 outline → 切除-拉伸3 (cut)
    with BuildSketch(Plane(origin=(0, 0, 0), x_dir=(0.707106781186546, -0.707106781186549, 0), z_dir=(0.707106781186549, 0.707106781186546, 0)).offset(CUT_EXTRUDE_START)):
        with Locations((16.451557856, -7.167019764)):
            Circle(CUT_EXTRUDE_3_OUTLINE_R)
    extrude(amount=CUT_EXTRUDE_3_DEPTH, mode=Mode.SUBTRACT)


solid = part.part
